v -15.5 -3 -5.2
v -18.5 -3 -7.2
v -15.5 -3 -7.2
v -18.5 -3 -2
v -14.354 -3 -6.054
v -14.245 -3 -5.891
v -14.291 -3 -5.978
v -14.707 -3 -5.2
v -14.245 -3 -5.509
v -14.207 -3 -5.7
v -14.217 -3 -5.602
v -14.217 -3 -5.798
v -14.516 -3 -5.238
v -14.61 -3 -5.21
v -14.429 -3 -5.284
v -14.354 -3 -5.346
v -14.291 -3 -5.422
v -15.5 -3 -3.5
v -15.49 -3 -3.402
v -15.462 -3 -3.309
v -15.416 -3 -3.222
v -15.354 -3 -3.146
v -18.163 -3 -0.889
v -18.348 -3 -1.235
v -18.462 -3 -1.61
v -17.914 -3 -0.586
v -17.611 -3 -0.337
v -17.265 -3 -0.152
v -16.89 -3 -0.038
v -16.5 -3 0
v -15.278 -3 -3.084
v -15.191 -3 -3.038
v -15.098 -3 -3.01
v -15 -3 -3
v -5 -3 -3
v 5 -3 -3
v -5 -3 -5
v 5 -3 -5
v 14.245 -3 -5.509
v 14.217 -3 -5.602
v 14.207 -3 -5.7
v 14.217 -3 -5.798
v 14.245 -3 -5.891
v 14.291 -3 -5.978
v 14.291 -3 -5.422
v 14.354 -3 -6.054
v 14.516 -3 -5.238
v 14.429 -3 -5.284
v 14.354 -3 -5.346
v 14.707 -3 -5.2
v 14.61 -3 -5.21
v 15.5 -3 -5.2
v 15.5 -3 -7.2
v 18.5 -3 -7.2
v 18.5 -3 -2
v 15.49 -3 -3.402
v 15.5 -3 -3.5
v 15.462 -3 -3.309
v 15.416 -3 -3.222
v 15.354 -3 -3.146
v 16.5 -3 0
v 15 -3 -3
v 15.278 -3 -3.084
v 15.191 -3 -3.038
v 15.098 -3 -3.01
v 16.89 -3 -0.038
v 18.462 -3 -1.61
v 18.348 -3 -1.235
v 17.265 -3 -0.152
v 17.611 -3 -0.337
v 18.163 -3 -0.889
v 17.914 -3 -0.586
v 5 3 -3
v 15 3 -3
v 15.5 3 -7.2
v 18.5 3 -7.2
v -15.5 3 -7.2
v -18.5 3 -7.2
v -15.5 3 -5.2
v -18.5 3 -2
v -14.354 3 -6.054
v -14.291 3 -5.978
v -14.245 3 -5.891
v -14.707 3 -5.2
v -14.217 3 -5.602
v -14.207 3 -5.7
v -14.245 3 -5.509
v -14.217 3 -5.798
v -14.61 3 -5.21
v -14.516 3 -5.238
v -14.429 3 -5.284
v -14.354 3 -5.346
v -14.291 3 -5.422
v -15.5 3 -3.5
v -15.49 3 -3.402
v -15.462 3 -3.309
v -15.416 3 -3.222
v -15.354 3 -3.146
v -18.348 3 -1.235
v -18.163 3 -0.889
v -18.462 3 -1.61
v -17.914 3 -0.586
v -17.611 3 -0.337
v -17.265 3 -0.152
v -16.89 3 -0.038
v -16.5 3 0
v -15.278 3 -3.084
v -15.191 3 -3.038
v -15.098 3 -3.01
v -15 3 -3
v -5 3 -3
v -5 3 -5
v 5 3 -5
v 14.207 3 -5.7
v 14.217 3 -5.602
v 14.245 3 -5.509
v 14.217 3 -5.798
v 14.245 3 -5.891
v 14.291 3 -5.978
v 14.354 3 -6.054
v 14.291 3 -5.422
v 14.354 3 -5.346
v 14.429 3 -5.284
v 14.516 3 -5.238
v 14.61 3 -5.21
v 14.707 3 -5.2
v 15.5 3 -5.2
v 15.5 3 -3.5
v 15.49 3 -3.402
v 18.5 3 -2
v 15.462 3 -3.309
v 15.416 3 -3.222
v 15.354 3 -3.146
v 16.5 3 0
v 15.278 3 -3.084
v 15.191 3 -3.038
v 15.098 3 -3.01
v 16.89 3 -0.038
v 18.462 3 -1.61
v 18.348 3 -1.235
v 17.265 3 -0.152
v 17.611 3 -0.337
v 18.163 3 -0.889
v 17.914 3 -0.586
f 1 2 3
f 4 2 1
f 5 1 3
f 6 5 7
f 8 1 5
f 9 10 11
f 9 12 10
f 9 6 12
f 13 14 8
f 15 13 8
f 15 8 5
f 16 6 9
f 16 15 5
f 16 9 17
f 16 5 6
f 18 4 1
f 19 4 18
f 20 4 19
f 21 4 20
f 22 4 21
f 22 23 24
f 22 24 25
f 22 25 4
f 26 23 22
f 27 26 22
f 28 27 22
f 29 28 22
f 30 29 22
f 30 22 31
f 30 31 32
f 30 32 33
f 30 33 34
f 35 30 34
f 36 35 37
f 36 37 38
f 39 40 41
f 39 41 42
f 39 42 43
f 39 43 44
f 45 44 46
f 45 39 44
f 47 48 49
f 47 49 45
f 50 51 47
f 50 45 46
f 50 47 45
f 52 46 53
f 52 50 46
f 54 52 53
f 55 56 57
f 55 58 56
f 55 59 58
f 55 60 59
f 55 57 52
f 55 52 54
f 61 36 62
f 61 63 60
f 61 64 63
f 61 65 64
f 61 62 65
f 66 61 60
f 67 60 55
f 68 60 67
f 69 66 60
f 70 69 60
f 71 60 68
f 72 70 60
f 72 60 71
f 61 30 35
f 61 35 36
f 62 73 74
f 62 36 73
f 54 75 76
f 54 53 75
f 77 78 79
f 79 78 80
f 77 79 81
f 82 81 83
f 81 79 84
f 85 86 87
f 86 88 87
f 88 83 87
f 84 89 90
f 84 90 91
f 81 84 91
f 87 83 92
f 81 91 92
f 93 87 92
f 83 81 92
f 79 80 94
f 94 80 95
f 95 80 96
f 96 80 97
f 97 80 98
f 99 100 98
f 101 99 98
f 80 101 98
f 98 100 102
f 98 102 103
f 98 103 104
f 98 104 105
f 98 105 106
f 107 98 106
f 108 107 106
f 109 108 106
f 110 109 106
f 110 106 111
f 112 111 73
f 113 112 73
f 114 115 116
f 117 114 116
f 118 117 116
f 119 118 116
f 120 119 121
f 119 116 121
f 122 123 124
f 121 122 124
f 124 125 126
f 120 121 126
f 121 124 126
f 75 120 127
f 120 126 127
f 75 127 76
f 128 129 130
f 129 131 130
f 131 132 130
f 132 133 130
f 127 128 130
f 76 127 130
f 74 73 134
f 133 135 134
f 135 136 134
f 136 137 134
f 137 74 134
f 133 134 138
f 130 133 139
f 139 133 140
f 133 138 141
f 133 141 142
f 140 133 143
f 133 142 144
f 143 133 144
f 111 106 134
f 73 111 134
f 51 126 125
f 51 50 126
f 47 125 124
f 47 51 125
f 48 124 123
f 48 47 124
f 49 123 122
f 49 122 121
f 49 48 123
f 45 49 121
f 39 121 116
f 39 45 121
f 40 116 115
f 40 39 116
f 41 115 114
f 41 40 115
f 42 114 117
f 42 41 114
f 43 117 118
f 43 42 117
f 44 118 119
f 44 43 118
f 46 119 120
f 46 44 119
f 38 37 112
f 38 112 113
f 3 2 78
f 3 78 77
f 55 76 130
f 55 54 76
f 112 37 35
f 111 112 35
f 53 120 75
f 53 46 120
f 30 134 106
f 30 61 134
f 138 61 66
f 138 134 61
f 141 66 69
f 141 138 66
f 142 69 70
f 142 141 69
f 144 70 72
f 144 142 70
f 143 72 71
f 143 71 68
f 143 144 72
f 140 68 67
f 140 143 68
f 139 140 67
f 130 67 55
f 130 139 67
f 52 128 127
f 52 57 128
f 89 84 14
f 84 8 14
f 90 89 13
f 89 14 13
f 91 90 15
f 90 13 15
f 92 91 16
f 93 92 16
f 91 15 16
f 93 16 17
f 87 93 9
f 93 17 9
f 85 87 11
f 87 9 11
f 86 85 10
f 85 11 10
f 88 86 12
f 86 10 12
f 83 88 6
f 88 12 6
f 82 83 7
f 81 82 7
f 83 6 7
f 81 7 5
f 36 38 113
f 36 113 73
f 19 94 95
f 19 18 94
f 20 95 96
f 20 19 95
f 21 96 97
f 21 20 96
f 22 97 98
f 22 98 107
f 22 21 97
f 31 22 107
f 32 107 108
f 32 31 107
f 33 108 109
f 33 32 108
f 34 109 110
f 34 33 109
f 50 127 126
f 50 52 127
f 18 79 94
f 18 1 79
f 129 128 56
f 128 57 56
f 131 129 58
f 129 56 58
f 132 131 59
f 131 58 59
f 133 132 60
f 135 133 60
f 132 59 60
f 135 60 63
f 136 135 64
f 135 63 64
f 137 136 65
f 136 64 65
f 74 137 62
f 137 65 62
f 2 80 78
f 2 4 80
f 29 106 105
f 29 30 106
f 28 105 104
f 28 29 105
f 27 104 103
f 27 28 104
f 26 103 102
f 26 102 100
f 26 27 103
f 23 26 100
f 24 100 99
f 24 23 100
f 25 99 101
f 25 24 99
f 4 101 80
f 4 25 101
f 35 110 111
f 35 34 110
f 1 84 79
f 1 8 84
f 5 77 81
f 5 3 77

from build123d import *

# Parameters (mm, degrees)
F0_W     = 10
F0_H     = 2
F1_DEPTH = 3
F2_R     = 2
F3_R     = 0.5
F4_R     = 0.5


with BuildPart() as f1:
    # F0 (on Front) → F1 (new body, symmetric)
    with BuildSketch(Plane.XZ):
        Polygon((18.5, 0), (-18.5, 0), (-18.5, -7.2), (-15.5, -7.2), (-13.5, -5.2), (-15.5, -5.2), (-15.5, -3), (-5, -3), (5, -3), (15.5, -3), (15.5, -5.2), (13.5, -5.2), (15.5, -7.2), (18.5, -7.2), align=None)
        with Locations((0, -4)):
            Rectangle(F0_W, F0_H)
    extrude(amount=F1_DEPTH, both=True)

    # F2
    f2_edges = [f1.edges().sort_by_distance(p)[0] for p in [
        (18.5, 0, 0),
        (-18.5, 0, 0),
    ]]
    fillet(f2_edges, radius=F2_R)

    # F3
    f3_edges = [f1.edges().sort_by_distance(p)[0] for p in [
        (15.5, 0, -3),
        (-15.5, 0, -3),
    ]]
    fillet(f3_edges, radius=F3_R)

    # F4
    f4_edges = [f1.edges().sort_by_distance(p)[0] for p in [
        (13.5, 0, -5.2),
        (-13.5, 0, -5.2),
    ]]
    fillet(f4_edges, radius=F4_R)


solid = f1.part
